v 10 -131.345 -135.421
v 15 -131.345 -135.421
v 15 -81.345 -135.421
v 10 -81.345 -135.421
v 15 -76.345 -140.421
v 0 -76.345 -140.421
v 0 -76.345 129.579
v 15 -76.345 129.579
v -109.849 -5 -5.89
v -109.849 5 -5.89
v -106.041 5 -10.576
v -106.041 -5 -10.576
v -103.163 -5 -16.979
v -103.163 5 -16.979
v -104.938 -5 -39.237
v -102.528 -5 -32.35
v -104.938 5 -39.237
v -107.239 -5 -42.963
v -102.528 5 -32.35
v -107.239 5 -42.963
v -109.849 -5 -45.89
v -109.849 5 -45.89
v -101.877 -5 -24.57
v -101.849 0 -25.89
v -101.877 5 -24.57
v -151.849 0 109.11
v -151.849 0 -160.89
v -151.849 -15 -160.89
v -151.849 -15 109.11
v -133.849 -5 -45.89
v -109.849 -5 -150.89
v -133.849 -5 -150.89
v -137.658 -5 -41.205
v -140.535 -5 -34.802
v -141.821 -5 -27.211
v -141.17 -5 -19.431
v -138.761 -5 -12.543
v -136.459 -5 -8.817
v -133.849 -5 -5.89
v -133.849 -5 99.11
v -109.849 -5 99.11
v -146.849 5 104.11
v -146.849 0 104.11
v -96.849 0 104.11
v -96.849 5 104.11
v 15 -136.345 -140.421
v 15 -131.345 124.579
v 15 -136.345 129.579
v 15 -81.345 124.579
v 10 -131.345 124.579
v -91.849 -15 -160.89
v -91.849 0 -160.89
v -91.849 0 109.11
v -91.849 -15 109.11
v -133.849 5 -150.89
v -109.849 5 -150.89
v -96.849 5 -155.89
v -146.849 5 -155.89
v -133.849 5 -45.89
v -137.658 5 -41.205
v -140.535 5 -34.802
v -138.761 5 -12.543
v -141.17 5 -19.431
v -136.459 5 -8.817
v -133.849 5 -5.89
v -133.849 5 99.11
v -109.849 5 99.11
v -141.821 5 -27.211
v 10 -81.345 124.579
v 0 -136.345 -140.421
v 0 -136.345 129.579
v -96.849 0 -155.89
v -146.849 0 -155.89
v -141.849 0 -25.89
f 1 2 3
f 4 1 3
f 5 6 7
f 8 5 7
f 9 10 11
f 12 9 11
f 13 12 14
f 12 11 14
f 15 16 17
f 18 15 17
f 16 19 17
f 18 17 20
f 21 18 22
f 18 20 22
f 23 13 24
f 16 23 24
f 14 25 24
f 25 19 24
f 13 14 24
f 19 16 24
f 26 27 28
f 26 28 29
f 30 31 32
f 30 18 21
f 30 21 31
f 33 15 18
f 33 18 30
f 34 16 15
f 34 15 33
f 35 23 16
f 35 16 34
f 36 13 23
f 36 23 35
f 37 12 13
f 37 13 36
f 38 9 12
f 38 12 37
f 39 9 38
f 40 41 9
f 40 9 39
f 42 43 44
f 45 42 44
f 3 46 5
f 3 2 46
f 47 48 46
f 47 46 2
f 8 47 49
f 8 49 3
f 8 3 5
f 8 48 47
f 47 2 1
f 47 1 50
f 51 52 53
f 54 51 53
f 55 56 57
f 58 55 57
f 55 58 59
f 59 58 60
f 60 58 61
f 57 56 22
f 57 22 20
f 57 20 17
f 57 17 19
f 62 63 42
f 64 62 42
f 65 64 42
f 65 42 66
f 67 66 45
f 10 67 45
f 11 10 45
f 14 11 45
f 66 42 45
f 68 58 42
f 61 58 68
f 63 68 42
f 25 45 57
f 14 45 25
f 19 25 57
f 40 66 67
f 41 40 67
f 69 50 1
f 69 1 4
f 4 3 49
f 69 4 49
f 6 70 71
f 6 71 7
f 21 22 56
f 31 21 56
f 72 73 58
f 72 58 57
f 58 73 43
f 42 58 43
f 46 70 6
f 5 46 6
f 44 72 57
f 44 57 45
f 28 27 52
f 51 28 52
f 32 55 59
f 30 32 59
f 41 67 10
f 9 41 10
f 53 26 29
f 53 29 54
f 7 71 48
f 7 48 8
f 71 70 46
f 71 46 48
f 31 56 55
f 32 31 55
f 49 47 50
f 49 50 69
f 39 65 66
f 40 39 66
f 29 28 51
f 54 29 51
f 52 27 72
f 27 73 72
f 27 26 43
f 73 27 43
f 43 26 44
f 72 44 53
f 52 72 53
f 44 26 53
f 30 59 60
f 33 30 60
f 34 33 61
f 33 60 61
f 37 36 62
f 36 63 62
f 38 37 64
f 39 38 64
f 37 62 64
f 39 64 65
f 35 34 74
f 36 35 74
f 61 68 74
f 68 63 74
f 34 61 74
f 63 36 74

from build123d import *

# Parameters (mm, degrees)
F0_W     = 60
F0_H     = 270
F2_DEPTH = 15
F3_W     = 50
F3_H     = 260
F4_DEPTH = 5
F1_W     = 60
F1_H     = 270
F5_DEPTH = 15
F6_W     = 50
F6_H     = 260
F7_DEPTH = 5
F9_DEPTH = 10


# Not quite as in the source:
# - a feature names something its author has since deleted; it is built from what else it names


with BuildPart() as f2:
    # F0 (on Front) → F2 (new body)
    with BuildSketch(Plane.XZ):
        with Locations((-121.8493213905, -25.8904273567)):
            Rectangle(F0_W, F0_H)
    extrude(amount=F2_DEPTH)

    # F3 (on face) → F4 (join)
    with BuildSketch(Plane.XZ):
        with Locations((-121.8493213905, -25.8904273567)):
            Rectangle(F3_W, F3_H)
    extrude(amount=-F4_DEPTH)

    # F8 (on face) → F9 (cut)
    with BuildSketch(Plane(origin=(0, 5, 0), x_dir=(-1, 0, 0), z_dir=(0, 1, 0))):
        with BuildLine():
            Line((109.8493213905, -150.8904273567), (133.8493213905, -150.8904273567))
            Line((133.8493213905, -150.8904273567), (133.8493213905, -45.8904273567))
            add(Edge.make_bspline(
                [(109.8493213905, -45.8904273567), (121.8493213905, -57.1404273567), (133.8493213905, -45.8904273567)],
                knots=[2.4980915448, 2.4980915448, 2.4980915448, 3.7850937624, 3.7850937624, 3.7850937624], degree=2, weights=[1, 0.8, 1]))
            Line((109.8493213905, -45.8904273567), (109.8493213905, -150.8904273567))
        make_face()
        with BuildLine():
            add(Edge.make_bspline(
                [(133.8493213905, -5.8904273567), (128.5159880572, -0.8904273567), (121.8493213905, -0.8904273567)],
                knots=[5.6396841984, 5.6396841984, 5.6396841984, 6.2831853072, 6.2831853072, 6.2831853072], degree=2, weights=[1, 0.9486832981, 1]))
            Line((133.8493213905, -5.8904273567), (133.8493213905, 99.1095726433))
            Line((133.8493213905, 99.1095726433), (109.8493213905, 99.1095726433))
            Line((109.8493213905, 99.1095726433), (109.8493213905, -5.8904273567))
            add(Edge.make_bspline(
                [(121.8493213905, -0.8904273567), (115.1826547239, -0.8904273567), (109.8493213905, -5.8904273567)],
                knots=[0, 0, 0, 0.6435011088, 0.6435011088, 0.6435011088], degree=2, weights=[1, 0.9486832981, 1]))
        make_face()
        with BuildLine():
            Line((133.8493213905, -5.8904273567), (133.8493213905, -45.8904273567))
            add(Edge.make_bspline(
                [(133.8493213905, -45.8904273567), (155.1826547239, -25.8904273567), (133.8493213905, -5.8904273567)],
                knots=[3.7850937624, 3.7850937624, 3.7850937624, 5.6396841984, 5.6396841984, 5.6396841984], degree=2, weights=[1, 0.6, 1]))
        make_face()
        with BuildLine():
            add(Edge.make_bspline(
                [(109.8493213905, -45.8904273567), (121.8493213905, -57.1404273567), (133.8493213905, -45.8904273567)],
                knots=[2.4980915448, 2.4980915448, 2.4980915448, 3.7850937624, 3.7850937624, 3.7850937624], degree=2, weights=[1, 0.8, 1]))
            Line((133.8493213905, -45.8904273567), (133.8493213905, -5.8904273567))
            add(Edge.make_bspline(
                [(133.8493213905, -5.8904273567), (128.5159880572, -0.8904273567), (121.8493213905, -0.8904273567)],
                knots=[5.6396841984, 5.6396841984, 5.6396841984, 6.2831853072, 6.2831853072, 6.2831853072], degree=2, weights=[1, 0.9486832981, 1]))
            add(Edge.make_bspline(
                [(121.8493213905, -0.8904273567), (115.1826547239, -0.8904273567), (109.8493213905, -5.8904273567)],
                knots=[0, 0, 0, 0.6435011088, 0.6435011088, 0.6435011088], degree=2, weights=[1, 0.9486832981, 1]))
            Line((109.8493213905, -5.8904273567), (109.8493213905, -45.8904273567))
        make_face()
        with BuildLine():
            add(Edge.make_bspline(
                [(109.8493213905, -5.8904273567), (88.5159880572, -25.8904273567), (109.8493213905, -45.8904273567)],
                knots=[0.6435011088, 0.6435011088, 0.6435011088, 2.4980915448, 2.4980915448, 2.4980915448], degree=2, weights=[1, 0.6, 1]))
            Line((109.8493213905, -45.8904273567), (109.8493213905, -5.8904273567))
        make_face()
    extrude(amount=-F9_DEPTH, mode=Mode.SUBTRACT)


with BuildPart() as f5:
    # F1 (on Right) → F5 (new body)
    with BuildSketch(Plane.YZ):
        with Locations((-106.3447256267, -5.4207965732)):
            Rectangle(F1_W, F1_H)
    extrude(amount=F5_DEPTH)

    # F6 (on face) → F7 (cut)
    with BuildSketch(Plane.YZ.offset(15)):
        with Locations((-106.3447256267, -5.4207965732)):
            Rectangle(F6_W, F6_H)
    extrude(amount=-F7_DEPTH, mode=Mode.SUBTRACT)


solid = Compound([f2.part, f5.part])
